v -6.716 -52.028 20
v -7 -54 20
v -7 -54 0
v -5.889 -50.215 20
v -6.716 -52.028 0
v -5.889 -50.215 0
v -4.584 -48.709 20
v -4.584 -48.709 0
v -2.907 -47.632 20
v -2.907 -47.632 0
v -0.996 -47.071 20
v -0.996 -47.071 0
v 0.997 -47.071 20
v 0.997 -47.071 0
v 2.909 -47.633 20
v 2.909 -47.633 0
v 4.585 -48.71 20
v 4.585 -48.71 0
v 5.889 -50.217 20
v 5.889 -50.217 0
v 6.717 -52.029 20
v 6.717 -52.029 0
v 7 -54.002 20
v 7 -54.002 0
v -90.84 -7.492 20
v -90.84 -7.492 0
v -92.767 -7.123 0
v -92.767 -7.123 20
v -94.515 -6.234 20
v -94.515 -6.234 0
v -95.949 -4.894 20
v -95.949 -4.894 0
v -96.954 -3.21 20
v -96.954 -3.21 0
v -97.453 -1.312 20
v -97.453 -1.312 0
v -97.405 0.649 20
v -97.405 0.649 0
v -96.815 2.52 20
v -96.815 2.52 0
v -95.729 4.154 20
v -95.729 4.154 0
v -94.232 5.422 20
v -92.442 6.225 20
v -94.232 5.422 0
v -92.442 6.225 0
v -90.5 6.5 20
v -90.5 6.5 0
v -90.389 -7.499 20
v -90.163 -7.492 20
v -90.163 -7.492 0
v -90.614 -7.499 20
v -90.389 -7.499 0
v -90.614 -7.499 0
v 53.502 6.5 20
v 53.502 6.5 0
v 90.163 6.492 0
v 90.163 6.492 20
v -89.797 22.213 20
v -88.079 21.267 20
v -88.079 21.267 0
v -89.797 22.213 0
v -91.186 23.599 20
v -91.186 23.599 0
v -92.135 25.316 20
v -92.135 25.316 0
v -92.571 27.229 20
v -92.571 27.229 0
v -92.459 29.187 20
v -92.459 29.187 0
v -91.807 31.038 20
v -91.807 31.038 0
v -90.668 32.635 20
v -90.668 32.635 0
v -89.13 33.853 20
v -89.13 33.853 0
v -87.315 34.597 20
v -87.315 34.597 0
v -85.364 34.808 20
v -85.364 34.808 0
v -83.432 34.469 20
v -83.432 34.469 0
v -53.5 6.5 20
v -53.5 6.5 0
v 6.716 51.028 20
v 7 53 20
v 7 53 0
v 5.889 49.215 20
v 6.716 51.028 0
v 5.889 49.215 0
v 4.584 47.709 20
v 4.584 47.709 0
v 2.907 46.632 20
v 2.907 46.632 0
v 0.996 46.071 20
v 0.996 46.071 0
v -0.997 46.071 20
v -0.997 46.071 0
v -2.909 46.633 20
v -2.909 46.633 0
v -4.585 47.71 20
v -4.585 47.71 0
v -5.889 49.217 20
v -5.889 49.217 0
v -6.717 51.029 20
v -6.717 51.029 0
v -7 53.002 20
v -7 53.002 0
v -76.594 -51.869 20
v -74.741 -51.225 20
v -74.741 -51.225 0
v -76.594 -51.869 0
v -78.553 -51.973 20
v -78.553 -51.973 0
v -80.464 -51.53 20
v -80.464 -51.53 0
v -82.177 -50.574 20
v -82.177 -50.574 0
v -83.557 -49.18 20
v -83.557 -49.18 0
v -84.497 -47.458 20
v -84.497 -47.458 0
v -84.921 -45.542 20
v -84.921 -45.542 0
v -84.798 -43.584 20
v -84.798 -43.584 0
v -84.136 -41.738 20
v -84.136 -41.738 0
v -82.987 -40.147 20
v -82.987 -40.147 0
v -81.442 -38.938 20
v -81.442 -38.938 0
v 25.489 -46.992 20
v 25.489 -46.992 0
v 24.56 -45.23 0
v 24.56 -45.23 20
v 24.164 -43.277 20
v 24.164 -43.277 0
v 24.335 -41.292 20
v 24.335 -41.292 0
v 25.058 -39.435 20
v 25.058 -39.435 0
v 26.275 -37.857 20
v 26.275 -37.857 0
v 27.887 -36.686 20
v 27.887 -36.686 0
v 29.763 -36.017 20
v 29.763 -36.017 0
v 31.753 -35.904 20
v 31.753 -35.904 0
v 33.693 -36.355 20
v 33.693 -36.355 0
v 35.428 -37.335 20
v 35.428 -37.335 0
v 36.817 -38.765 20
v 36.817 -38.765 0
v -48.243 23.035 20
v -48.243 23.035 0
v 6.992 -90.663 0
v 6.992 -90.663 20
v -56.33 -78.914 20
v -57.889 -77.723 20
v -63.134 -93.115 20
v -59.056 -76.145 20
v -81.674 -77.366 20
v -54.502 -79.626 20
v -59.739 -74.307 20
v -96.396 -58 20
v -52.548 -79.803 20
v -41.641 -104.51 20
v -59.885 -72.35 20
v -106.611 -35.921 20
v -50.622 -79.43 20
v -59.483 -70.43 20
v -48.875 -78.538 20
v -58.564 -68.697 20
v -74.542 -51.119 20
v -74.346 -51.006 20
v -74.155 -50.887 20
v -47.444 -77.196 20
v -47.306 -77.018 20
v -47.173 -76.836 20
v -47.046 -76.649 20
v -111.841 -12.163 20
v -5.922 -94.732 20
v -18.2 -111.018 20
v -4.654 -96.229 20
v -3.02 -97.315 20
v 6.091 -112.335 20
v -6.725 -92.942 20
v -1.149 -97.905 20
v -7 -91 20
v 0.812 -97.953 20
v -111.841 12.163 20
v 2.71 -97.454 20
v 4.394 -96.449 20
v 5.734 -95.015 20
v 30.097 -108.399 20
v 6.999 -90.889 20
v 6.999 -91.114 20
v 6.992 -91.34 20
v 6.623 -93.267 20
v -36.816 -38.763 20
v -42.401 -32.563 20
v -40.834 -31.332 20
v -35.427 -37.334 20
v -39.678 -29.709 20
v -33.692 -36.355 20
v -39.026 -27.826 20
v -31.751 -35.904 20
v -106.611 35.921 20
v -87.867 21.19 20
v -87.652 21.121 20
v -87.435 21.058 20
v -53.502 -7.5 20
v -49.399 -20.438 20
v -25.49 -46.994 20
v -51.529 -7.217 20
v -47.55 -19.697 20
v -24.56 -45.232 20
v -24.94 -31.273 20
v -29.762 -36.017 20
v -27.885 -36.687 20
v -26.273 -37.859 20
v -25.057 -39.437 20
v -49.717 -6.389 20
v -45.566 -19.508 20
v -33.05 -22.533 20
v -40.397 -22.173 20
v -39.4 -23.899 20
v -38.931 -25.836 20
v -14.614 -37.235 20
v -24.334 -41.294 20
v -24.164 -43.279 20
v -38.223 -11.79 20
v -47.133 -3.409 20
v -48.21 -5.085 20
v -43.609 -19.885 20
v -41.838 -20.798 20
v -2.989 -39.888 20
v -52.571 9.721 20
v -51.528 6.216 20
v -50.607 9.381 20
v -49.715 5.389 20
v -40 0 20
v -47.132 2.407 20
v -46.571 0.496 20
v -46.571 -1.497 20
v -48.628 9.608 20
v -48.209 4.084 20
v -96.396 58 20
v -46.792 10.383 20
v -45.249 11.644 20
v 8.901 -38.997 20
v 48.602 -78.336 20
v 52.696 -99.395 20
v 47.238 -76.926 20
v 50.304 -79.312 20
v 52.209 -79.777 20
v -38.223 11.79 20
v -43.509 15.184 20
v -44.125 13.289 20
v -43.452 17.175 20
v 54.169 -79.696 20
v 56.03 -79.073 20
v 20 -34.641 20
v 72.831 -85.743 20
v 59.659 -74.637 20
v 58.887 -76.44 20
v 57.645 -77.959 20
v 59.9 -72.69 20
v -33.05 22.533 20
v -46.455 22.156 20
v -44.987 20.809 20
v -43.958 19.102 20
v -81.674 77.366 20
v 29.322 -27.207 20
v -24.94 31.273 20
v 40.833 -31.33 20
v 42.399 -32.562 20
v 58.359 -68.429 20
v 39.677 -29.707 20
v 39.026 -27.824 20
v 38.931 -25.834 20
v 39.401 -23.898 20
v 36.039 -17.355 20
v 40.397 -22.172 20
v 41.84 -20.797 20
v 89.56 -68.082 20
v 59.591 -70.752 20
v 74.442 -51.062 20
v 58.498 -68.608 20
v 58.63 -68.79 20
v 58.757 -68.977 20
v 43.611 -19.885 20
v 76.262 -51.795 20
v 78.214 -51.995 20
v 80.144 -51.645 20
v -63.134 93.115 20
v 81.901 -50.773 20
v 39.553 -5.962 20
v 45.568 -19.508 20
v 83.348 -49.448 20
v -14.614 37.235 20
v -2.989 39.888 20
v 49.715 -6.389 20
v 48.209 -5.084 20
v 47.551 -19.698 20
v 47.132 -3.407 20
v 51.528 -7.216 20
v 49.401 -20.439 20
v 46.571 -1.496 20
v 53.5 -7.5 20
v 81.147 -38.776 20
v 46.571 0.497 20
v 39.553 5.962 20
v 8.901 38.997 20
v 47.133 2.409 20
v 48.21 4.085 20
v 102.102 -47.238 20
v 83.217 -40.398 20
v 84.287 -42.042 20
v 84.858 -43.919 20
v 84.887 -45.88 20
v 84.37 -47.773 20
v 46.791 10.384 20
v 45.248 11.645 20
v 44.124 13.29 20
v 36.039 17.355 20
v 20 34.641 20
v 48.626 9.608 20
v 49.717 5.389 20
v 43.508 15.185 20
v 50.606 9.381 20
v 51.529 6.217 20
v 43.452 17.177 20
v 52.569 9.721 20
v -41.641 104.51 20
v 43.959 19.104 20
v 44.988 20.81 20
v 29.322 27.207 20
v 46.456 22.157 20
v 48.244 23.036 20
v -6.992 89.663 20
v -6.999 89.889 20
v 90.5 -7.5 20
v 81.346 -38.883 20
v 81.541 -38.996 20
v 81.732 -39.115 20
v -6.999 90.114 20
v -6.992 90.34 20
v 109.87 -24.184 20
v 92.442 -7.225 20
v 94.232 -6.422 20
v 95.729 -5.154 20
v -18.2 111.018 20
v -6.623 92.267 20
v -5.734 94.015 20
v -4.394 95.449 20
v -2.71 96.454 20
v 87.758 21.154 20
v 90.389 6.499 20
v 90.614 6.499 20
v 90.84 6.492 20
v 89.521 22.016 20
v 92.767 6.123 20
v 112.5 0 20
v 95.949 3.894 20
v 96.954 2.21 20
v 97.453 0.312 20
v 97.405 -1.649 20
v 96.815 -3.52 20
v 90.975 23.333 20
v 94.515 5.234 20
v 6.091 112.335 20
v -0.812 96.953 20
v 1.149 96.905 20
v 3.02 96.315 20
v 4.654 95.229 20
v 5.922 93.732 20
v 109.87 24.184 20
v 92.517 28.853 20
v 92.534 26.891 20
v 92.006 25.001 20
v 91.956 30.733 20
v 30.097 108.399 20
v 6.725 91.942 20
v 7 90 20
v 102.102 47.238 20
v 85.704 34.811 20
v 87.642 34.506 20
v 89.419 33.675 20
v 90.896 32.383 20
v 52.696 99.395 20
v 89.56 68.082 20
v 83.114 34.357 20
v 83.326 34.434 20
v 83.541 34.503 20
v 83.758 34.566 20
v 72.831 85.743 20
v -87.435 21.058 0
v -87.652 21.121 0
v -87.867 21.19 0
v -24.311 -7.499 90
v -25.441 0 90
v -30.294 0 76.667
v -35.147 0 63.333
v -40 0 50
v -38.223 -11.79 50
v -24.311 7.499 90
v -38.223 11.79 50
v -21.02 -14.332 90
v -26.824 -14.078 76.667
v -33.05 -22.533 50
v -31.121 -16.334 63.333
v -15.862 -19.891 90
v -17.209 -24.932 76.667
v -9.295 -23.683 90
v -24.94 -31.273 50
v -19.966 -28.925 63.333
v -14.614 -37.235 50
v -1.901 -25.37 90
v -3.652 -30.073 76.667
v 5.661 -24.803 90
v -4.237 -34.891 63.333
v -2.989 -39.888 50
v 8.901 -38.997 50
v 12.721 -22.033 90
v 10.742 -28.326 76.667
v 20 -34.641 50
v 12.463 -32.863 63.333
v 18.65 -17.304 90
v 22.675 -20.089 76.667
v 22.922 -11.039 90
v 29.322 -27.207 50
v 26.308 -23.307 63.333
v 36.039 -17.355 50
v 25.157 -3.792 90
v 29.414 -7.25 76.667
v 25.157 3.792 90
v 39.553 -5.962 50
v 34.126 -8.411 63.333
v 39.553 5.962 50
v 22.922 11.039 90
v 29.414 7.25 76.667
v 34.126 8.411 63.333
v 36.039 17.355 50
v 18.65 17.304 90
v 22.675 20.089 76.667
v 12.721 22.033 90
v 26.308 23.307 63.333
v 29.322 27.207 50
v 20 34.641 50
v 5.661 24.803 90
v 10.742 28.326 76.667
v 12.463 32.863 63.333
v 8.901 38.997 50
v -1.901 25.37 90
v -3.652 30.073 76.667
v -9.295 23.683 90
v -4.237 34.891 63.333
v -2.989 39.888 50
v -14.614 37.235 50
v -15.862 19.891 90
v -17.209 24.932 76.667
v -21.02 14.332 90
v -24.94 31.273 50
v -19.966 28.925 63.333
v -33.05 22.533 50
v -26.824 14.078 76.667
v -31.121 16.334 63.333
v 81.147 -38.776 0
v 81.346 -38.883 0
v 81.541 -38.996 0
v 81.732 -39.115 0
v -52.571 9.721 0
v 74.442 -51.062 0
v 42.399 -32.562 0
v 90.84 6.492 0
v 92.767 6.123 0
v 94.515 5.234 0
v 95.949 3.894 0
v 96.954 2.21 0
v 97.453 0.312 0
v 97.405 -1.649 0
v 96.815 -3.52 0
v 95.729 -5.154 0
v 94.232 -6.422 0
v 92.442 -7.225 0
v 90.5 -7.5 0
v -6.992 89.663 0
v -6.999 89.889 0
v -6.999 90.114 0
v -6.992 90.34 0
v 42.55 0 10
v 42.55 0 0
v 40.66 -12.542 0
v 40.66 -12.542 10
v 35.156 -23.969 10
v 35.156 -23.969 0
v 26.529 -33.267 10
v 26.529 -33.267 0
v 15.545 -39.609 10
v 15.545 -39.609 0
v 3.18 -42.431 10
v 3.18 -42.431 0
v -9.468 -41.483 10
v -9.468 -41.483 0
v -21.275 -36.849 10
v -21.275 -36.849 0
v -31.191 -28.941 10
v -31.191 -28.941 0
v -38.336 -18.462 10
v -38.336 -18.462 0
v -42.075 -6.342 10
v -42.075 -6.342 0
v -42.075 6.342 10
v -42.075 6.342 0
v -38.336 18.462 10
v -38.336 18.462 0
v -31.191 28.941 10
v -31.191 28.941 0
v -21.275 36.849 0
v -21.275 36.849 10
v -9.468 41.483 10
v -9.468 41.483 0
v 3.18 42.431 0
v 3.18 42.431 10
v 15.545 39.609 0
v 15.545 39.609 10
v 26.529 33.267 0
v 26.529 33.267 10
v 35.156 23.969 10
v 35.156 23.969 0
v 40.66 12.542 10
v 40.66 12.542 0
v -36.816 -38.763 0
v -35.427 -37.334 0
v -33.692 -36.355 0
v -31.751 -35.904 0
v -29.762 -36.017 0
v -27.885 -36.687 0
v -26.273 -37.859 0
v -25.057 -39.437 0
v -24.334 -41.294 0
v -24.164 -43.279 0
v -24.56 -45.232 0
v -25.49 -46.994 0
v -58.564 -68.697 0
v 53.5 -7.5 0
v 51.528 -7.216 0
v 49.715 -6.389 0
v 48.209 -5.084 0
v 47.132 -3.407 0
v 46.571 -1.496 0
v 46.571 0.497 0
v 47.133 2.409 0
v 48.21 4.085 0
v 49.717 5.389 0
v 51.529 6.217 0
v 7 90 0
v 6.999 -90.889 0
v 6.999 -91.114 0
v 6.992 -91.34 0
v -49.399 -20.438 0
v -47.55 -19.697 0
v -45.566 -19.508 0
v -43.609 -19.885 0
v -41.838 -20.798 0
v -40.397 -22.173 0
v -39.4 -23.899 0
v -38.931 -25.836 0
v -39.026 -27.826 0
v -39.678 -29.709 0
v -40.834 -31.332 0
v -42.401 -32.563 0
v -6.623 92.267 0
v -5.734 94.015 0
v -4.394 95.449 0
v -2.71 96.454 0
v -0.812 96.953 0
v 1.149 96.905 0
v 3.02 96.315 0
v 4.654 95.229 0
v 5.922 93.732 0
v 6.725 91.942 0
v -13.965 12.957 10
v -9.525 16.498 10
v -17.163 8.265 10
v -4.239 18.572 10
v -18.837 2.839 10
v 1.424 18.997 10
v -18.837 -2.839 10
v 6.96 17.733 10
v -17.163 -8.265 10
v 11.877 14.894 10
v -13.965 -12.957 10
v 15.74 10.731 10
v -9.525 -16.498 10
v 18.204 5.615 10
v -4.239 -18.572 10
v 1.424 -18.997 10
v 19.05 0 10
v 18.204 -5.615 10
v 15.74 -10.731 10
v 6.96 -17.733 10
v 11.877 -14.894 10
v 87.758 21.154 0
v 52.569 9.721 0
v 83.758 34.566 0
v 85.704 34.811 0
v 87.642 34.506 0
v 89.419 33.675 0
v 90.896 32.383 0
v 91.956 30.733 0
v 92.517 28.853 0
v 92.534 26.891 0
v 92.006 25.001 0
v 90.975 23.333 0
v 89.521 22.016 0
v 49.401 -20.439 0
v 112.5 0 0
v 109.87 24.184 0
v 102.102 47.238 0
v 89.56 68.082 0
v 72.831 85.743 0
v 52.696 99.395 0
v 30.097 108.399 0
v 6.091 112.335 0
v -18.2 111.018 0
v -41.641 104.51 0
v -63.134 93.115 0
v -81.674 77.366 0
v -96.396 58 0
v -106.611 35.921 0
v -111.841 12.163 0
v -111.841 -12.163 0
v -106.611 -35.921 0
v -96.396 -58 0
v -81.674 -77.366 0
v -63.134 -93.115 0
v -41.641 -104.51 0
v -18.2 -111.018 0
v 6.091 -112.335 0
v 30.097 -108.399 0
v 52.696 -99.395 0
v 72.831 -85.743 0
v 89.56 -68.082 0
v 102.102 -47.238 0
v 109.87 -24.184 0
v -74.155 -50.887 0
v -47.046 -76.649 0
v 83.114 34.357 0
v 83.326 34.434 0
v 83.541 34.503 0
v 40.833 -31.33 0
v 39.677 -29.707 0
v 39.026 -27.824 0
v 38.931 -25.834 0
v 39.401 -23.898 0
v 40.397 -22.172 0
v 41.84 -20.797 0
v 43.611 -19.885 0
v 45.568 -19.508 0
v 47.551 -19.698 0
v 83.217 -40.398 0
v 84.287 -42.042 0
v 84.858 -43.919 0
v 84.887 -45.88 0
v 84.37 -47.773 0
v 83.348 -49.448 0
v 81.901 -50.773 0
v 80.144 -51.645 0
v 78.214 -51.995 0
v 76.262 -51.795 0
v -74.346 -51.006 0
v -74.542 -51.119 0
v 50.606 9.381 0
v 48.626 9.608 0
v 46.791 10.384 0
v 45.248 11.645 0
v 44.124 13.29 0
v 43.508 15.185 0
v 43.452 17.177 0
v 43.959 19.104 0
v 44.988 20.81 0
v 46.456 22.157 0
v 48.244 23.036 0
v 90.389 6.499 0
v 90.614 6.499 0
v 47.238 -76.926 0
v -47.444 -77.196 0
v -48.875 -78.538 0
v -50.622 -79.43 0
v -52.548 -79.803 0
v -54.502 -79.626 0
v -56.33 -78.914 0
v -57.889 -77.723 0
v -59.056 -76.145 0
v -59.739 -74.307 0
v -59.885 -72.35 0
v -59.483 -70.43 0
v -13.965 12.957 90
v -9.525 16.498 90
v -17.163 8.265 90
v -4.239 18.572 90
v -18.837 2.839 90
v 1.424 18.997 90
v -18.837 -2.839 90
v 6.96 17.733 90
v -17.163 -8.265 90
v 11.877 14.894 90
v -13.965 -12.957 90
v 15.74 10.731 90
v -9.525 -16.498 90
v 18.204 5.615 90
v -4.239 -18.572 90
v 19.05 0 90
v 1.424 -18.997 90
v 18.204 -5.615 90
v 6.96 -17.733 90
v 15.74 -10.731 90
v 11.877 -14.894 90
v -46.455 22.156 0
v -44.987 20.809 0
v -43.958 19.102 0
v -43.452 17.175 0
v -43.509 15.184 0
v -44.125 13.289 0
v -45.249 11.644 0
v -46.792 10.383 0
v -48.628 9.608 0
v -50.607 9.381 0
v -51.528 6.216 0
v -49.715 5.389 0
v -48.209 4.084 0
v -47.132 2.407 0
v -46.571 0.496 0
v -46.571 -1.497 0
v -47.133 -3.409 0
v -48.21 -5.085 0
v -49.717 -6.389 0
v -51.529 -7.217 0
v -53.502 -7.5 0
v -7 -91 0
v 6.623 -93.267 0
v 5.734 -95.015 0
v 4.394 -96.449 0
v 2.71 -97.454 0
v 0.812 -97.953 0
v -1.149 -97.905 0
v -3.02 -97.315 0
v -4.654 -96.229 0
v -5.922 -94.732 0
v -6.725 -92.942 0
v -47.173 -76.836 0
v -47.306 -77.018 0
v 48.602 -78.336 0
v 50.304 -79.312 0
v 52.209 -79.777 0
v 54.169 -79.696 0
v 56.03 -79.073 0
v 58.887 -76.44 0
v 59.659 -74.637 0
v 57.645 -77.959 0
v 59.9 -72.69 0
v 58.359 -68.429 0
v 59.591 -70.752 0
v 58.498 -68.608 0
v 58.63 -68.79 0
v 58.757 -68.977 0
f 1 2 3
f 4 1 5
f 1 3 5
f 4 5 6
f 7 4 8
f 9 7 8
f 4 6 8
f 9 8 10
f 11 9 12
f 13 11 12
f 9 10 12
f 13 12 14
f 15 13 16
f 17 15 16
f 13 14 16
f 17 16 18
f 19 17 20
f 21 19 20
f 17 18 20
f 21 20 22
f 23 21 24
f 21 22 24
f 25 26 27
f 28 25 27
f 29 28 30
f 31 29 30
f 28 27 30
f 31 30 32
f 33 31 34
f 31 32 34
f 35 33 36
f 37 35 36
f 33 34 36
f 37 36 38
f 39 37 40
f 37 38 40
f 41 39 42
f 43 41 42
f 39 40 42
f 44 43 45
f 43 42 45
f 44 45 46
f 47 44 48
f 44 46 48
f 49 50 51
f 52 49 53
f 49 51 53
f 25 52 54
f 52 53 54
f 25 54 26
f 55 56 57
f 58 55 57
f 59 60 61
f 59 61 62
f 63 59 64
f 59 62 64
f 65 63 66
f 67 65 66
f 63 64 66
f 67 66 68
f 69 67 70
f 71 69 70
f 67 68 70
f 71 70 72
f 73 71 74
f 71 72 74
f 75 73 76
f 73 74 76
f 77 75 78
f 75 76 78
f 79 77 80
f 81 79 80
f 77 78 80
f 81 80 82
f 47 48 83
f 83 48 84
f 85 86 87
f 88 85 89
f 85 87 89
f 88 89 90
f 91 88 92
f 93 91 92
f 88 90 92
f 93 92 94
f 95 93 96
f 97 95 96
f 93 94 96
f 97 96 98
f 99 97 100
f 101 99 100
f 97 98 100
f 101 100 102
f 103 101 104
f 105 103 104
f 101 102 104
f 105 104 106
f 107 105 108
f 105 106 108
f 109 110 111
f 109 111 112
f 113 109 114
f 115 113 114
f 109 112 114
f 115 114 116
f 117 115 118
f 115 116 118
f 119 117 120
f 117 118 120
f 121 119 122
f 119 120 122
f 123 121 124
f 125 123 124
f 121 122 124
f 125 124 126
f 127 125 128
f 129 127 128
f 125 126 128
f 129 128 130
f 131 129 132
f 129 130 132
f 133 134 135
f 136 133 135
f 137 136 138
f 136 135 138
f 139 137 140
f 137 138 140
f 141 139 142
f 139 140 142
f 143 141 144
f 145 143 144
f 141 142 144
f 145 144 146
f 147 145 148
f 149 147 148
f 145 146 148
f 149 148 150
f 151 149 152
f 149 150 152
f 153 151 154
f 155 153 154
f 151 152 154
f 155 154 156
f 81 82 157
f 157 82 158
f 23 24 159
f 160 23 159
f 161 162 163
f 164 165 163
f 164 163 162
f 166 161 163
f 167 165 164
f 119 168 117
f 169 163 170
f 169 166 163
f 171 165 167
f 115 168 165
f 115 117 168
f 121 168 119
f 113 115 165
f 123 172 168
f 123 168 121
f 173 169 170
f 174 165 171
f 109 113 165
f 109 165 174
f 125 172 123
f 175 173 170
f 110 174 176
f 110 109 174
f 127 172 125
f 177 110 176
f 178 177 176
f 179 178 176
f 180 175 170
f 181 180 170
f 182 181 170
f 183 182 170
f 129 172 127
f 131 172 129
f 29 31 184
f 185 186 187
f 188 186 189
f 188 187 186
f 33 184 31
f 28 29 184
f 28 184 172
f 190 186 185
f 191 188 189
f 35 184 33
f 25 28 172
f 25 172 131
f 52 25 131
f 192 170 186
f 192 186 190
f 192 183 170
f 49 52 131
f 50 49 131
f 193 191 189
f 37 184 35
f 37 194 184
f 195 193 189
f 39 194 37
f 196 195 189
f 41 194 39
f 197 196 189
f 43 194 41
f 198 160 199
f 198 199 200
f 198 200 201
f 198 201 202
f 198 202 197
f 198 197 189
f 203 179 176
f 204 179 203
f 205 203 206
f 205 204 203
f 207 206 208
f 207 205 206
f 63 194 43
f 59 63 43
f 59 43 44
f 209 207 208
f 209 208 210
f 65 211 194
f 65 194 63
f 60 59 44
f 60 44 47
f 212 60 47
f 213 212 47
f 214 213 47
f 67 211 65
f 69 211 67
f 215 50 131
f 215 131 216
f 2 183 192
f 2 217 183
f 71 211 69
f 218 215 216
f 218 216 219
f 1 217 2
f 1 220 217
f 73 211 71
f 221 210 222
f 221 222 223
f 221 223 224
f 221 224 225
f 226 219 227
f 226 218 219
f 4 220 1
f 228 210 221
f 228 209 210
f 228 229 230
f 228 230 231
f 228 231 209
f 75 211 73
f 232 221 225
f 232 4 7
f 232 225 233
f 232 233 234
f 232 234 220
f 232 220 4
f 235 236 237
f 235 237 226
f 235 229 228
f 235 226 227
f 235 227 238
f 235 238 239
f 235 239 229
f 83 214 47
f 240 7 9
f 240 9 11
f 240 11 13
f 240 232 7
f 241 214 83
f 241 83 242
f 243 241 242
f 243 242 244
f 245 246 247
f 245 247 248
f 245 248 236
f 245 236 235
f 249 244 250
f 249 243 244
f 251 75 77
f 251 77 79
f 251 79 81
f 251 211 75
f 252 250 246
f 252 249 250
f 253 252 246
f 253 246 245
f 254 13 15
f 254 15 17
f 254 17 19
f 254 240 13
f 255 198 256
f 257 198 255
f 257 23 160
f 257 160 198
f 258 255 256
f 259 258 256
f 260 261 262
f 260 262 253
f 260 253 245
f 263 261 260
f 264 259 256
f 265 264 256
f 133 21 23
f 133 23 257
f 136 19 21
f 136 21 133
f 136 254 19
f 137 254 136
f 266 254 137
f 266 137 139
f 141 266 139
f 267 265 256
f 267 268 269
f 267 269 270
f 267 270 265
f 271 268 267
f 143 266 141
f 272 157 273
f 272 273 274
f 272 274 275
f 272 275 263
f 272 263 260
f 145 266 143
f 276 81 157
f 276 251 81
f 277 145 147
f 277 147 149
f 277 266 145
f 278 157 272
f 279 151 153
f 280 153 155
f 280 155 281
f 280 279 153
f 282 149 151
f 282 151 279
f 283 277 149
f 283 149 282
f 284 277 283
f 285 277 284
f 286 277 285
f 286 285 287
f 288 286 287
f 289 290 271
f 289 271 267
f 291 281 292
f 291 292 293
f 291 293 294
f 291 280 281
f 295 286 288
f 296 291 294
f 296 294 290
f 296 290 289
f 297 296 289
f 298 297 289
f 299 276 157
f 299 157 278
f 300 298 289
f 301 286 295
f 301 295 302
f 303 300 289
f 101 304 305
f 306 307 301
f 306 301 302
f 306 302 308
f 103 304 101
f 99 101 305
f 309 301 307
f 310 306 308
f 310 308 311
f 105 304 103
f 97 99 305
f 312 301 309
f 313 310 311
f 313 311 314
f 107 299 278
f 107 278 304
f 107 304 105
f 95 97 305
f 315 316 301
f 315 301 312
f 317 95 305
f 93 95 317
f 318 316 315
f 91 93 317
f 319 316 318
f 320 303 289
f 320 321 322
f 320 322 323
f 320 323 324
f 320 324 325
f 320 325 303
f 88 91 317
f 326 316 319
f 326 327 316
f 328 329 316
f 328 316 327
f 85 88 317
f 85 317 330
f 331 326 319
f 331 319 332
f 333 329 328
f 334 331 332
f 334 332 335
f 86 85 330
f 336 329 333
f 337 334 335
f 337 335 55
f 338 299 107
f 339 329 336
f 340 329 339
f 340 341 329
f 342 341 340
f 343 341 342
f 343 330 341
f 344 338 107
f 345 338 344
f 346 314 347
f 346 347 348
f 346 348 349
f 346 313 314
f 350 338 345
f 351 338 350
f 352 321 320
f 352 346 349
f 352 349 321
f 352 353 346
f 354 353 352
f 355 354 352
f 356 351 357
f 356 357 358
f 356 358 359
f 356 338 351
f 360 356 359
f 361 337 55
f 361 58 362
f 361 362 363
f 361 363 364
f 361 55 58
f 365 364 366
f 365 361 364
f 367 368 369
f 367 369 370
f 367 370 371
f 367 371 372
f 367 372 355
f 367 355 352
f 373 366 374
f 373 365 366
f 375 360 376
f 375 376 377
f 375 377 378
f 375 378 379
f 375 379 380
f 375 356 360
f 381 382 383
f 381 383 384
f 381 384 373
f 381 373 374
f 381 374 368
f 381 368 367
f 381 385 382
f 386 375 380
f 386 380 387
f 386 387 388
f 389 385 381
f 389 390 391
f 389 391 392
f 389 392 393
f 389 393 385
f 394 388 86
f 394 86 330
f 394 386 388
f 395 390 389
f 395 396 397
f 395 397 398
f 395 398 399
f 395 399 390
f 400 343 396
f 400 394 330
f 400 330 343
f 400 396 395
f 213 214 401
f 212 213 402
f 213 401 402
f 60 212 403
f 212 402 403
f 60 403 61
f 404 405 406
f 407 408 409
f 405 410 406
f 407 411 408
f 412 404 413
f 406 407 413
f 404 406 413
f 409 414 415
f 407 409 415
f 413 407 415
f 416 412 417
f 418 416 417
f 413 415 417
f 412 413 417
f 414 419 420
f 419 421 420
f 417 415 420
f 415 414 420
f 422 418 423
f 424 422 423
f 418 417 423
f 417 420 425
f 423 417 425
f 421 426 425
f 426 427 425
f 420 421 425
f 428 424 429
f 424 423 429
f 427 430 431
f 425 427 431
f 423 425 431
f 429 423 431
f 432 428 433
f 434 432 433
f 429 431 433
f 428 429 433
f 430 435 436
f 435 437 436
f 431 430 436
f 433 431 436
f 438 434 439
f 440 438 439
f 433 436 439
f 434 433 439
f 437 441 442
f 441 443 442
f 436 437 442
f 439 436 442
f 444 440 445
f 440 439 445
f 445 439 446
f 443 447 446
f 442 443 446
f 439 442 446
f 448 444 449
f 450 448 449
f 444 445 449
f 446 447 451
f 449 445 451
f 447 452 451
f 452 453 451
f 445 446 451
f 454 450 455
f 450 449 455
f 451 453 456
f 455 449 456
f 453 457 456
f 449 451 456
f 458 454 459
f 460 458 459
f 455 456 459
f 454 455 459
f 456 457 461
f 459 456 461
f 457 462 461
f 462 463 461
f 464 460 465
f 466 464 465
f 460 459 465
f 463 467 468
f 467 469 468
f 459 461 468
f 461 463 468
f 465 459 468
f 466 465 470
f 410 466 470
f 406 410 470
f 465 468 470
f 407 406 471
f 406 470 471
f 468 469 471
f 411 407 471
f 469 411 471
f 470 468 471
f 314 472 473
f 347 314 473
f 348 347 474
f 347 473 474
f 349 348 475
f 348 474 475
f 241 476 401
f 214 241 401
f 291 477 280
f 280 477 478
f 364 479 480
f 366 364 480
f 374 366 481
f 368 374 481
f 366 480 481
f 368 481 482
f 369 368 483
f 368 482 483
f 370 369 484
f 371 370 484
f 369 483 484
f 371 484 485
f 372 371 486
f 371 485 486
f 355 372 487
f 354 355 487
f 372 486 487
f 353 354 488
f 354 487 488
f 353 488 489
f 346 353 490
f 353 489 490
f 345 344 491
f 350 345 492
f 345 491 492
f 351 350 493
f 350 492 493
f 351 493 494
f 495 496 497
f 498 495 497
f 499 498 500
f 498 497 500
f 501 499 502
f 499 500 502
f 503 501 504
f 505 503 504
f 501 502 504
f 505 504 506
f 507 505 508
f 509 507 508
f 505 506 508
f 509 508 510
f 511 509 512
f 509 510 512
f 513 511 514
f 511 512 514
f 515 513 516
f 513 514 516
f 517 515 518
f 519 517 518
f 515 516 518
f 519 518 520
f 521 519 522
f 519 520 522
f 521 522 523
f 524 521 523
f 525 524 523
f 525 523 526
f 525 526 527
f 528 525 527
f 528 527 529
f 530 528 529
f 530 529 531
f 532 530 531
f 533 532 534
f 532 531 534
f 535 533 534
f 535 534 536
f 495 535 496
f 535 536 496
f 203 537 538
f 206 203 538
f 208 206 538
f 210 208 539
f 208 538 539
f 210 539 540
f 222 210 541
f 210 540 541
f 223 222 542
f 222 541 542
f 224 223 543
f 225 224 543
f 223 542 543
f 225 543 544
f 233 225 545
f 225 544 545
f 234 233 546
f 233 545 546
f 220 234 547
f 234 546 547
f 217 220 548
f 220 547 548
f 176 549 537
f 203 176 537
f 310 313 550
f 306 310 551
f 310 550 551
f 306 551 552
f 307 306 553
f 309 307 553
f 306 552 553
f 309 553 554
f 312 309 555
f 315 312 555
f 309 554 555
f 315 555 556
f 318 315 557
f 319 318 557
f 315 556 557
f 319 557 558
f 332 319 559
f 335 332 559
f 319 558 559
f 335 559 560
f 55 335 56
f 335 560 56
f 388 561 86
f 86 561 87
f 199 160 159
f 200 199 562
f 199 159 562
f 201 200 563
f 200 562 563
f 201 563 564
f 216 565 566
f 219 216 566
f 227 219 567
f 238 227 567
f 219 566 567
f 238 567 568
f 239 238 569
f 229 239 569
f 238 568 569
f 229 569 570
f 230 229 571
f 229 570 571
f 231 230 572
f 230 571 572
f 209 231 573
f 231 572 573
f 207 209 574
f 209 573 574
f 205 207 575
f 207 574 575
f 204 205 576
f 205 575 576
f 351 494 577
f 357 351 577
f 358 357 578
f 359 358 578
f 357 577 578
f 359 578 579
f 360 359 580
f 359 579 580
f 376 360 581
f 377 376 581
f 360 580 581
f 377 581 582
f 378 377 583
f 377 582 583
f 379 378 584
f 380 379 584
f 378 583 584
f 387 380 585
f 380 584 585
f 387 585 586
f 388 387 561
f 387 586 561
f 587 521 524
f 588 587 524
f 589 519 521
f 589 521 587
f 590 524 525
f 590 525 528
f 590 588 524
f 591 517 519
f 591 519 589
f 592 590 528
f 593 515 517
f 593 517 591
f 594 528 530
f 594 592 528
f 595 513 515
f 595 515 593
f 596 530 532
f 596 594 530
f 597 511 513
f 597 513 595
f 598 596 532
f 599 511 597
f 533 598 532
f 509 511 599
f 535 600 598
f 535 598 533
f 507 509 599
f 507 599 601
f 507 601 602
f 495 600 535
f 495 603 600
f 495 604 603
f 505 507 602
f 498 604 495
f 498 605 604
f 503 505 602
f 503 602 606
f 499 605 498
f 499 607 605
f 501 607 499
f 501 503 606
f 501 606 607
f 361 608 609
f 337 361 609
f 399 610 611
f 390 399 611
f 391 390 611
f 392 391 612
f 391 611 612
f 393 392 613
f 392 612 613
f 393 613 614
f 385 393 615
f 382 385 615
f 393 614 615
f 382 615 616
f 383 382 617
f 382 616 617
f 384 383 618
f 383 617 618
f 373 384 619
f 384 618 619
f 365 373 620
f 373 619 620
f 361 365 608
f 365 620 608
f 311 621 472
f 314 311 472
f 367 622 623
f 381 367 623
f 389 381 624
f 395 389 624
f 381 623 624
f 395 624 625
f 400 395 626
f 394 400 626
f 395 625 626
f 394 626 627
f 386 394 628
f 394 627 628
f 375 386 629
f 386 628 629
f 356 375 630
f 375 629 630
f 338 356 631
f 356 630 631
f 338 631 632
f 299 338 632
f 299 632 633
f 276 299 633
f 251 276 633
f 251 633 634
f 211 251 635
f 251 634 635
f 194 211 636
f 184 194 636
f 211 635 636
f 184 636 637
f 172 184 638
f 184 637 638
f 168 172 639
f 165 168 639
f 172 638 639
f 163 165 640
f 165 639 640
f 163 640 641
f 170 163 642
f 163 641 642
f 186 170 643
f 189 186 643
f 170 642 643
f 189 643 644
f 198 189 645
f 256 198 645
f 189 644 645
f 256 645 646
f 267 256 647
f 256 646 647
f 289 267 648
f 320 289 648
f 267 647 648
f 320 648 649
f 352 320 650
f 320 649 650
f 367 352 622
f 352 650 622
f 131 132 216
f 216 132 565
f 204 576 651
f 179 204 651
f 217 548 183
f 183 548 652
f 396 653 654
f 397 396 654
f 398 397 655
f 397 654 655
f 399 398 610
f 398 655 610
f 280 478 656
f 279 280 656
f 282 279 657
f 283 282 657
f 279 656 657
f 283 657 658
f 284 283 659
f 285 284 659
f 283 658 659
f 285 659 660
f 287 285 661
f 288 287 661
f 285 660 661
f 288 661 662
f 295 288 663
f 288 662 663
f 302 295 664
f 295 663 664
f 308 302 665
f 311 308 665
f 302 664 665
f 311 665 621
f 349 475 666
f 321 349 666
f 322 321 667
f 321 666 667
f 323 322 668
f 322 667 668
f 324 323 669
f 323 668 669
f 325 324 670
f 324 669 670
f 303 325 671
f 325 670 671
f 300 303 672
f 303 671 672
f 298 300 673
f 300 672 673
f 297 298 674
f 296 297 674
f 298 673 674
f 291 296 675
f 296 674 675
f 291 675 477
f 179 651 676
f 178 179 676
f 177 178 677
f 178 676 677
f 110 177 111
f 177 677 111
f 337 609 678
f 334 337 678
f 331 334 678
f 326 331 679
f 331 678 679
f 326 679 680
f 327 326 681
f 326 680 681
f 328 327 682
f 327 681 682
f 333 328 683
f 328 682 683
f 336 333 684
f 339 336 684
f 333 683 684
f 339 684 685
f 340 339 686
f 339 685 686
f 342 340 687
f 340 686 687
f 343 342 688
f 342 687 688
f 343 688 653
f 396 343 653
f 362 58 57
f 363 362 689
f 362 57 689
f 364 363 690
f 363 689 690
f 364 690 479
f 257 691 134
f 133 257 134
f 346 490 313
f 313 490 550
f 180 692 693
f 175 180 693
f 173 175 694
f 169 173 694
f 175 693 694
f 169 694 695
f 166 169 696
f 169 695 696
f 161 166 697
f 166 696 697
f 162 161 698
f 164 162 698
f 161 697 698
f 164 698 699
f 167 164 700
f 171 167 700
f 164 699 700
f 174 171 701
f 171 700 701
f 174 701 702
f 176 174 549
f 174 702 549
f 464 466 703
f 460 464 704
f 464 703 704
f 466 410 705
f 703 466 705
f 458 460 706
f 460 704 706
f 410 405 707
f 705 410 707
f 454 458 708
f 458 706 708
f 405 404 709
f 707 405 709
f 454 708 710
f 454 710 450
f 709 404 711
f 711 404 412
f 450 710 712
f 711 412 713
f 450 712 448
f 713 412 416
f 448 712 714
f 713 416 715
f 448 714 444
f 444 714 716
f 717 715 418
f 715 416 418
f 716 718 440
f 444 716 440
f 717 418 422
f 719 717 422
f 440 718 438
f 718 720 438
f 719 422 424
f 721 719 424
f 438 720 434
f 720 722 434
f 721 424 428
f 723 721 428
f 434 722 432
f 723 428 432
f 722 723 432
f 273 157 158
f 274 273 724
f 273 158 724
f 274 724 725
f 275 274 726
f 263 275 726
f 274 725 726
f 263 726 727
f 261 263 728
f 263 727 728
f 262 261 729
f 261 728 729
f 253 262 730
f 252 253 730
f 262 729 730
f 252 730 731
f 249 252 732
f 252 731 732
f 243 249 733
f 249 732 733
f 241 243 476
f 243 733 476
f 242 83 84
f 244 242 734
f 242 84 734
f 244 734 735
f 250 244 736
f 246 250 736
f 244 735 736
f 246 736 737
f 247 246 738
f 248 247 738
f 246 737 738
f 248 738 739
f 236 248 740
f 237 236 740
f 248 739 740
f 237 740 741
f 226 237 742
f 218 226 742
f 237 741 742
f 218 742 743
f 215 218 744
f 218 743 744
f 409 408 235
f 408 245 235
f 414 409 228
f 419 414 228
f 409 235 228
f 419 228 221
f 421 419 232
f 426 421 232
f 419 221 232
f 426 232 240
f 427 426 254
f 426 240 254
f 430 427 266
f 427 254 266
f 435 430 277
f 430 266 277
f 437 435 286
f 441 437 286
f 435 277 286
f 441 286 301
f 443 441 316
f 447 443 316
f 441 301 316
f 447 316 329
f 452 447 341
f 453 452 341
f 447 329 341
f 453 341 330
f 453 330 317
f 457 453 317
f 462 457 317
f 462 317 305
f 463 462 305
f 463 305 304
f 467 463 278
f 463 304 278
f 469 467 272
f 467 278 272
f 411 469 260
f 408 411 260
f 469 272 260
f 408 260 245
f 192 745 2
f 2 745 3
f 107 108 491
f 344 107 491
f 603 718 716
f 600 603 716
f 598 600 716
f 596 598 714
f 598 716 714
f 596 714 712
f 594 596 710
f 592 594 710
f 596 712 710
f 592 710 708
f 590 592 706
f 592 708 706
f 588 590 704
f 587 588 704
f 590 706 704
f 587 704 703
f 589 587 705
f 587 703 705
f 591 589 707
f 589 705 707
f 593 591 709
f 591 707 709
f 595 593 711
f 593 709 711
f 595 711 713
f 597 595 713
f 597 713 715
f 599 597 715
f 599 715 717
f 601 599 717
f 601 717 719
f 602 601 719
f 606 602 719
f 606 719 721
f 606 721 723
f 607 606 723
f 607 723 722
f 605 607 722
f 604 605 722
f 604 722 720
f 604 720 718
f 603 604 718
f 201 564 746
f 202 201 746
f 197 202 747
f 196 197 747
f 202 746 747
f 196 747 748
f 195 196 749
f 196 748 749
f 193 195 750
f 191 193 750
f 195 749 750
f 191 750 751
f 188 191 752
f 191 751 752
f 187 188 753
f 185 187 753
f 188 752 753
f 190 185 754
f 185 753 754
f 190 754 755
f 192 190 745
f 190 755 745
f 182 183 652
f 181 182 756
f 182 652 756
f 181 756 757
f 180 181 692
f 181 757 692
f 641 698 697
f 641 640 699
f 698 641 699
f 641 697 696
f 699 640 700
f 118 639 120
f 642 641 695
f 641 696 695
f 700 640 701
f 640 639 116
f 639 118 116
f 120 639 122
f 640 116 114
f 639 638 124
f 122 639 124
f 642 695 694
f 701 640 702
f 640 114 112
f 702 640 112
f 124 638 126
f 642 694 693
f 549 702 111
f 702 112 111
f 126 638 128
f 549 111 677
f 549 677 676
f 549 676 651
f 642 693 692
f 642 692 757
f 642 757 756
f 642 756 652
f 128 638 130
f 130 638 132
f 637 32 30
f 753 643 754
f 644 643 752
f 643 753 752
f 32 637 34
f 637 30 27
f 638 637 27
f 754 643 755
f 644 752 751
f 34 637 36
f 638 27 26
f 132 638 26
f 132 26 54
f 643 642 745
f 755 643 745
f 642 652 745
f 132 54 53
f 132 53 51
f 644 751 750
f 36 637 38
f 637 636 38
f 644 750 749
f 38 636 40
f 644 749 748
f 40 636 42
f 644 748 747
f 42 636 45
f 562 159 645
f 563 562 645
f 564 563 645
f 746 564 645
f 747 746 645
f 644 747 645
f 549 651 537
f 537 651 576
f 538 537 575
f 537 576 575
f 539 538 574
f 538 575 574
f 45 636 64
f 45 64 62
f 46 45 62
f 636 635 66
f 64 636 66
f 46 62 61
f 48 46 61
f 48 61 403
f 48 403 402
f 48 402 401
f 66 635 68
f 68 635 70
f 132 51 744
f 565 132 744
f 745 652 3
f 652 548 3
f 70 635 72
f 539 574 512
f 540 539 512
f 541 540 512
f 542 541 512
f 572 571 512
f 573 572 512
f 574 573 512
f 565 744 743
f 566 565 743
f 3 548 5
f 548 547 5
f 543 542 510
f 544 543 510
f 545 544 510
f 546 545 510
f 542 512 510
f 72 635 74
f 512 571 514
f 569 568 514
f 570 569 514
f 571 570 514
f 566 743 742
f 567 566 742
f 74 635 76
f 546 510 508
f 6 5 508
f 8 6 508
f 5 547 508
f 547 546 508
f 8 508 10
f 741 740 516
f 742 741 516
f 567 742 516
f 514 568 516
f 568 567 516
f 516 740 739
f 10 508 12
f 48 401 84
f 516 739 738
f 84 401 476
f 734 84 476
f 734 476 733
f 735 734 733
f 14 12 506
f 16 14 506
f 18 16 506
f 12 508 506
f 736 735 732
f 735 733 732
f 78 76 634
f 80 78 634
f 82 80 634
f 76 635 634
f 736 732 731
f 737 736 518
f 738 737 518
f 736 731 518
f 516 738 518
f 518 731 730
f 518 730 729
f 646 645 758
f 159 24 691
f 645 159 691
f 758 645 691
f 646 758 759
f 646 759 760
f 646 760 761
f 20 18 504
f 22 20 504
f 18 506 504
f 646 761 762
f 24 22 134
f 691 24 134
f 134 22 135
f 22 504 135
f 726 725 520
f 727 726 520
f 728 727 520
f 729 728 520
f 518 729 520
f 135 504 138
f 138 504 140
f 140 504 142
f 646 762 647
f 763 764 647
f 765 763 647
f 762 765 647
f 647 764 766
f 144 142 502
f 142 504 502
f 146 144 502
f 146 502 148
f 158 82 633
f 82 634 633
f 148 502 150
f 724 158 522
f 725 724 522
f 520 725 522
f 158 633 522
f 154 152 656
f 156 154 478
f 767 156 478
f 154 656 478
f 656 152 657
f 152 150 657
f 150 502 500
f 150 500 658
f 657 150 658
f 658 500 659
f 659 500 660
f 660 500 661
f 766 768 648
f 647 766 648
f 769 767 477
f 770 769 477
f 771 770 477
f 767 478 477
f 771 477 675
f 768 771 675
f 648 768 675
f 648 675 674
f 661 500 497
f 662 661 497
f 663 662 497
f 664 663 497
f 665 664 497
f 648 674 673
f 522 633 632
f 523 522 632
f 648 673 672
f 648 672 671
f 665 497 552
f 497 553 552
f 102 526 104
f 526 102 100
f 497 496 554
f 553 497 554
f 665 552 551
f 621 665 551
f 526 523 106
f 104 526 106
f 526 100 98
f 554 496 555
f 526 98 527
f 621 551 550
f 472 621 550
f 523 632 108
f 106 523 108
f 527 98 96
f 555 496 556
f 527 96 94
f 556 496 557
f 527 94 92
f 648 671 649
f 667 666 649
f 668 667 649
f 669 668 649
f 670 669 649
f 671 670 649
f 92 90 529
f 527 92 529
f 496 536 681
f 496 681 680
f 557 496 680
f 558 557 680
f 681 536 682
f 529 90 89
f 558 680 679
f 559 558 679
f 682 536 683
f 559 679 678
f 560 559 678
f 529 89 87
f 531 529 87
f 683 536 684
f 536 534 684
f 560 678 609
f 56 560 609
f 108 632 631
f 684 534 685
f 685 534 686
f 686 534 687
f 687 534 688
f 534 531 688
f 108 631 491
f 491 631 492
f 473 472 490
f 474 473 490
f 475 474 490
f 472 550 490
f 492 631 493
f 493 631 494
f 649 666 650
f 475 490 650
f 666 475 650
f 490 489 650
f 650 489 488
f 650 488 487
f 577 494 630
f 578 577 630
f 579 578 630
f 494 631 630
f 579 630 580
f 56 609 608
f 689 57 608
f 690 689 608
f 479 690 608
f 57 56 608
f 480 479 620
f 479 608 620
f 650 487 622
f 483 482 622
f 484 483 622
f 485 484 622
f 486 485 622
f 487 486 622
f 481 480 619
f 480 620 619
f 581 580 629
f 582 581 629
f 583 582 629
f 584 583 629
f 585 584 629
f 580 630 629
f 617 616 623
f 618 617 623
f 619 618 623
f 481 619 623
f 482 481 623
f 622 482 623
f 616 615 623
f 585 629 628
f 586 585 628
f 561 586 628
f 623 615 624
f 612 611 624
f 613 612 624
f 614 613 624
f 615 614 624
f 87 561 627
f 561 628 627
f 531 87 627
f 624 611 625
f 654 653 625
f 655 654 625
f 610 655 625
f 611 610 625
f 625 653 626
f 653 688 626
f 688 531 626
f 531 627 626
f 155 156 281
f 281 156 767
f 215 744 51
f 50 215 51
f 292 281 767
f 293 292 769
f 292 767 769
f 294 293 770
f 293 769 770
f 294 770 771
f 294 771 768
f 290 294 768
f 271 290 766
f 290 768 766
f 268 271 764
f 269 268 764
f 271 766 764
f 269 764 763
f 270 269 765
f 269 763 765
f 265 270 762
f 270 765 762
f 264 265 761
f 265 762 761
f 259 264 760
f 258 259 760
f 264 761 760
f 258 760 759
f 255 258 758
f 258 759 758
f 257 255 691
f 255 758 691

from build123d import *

# Parameters (mm, degrees)
F0_R     = 112.5
F1_DEPTH = 20
F4_R     = 19.05
F5_DEPTH = 90
F6_R     = 42.55
F7_DEPTH = 10


with BuildPart() as f1:
    # F0 (on Top) → F1 (new body)
    with BuildSketch(Plane.XY):
        Circle(F0_R)
        with BuildLine():
            ThreePointArc((-47.443954, -77.196073), (-57.151446, -78.373088), (-58.563792, -68.697033))
            Line((-58.563792, -68.697033), (-36.815737, -38.763404))
            ThreePointArc((-36.815737, -38.763404), (-27.037496, -37.215236), (-25.490409, -46.993649))
            Line((-25.490409, -46.993649), (-47.046201, -76.648867))
            ThreePointArc((-47.046201, -76.648867), (-47.238463, -76.927278), (-47.443954, -77.196073))
        make_face(mode=Mode.SUBTRACT)
        with BuildLine():
            ThreePointArc((-74.74068, -51.224927), (-84.08765, -48.351791), (-81.442286, -38.937822))
            Line((-81.442286, -38.937822), (-49.399346, -20.437822))
            ThreePointArc((-49.399346, -20.437822), (-39.836782, -23.00067), (-42.400686, -32.562951))
            Line((-42.400686, -32.562951), (-74.154746, -50.886811))
            ThreePointArc((-74.154746, -50.886811), (-74.443626, -51.062951), (-74.74068, -51.224927))
        make_face(mode=Mode.SUBTRACT)
        with BuildLine():
            ThreePointArc((-90.839791, -7.491748), (-97.497937, -0.330054), (-90.5, 6.5))
            Line((-90.5, 6.5), (-53.5, 6.5))
            ThreePointArc((-53.5, 6.5), (-46.5, -0.500773), (-53.501547, -7.5))
            Line((-53.501547, -7.5), (-90.163299, -7.491898))
            ThreePointArc((-90.163299, -7.491898), (-90.501547, -7.5), (-90.839791, -7.491748))
        make_face(mode=Mode.SUBTRACT)
        with BuildLine():
            ThreePointArc((6.991748, -91.339791), (-0.169946, -97.997937), (-7, -91))
            Line((-7, -91), (-7, -54))
            ThreePointArc((-7, -54), (0.000773, -47), (7, -54.001547))
            Line((7, -54.001547), (6.991898, -90.663299))
            ThreePointArc((6.991898, -90.663299), (7, -91.001547), (6.991748, -91.339791))
        make_face(mode=Mode.SUBTRACT)
        with BuildLine():
            ThreePointArc((58.75684, -68.97678), (56.876468, -78.572871), (47.237554, -76.926026))
            Line((47.237554, -76.926026), (25.489499, -46.992397))
            ThreePointArc((25.489499, -46.992397), (27.038747, -37.214327), (36.816646, -38.764656))
            Line((36.816646, -38.764656), (58.359329, -68.429399))
            ThreePointArc((58.359329, -68.429399), (58.564701, -68.698284), (58.75684, -68.97678))
        make_face(mode=Mode.SUBTRACT)
        with BuildLine():
            ThreePointArc((81.732428, -39.114864), (83.917705, -48.646146), (74.442286, -51.062178))
            Line((74.442286, -51.062178), (42.399346, -32.562178))
            ThreePointArc((42.399346, -32.562178), (39.837555, -22.99933), (49.400686, -20.438596))
            Line((49.400686, -20.438596), (81.146644, -38.776489))
            ThreePointArc((81.146644, -38.776489), (81.443626, -38.938596), (81.732428, -39.114864))
        make_face(mode=Mode.SUBTRACT)
        with BuildLine():
            ThreePointArc((90.839791, 6.491748), (97.497937, -0.669946), (90.5, -7.5))
            Line((90.5, -7.5), (53.5, -7.5))
            ThreePointArc((53.5, -7.5), (46.5, -0.499227), (53.501547, 6.5))
            Line((53.501547, 6.5), (90.163299, 6.491898))
            ThreePointArc((90.163299, 6.491898), (90.501547, 6.5), (90.839791, 6.491748))
        make_face(mode=Mode.SUBTRACT)
        with BuildLine():
            ThreePointArc((-88.078816, 21.266983), (-92.198004, 30.135639), (-83.431968, 34.468925))
            Line((-83.431968, 34.468925), (-48.242876, 23.035296))
            ThreePointArc((-48.242876, 23.035296), (-43.748839, 14.214046), (-52.570586, 9.720983))
            Line((-52.570586, 9.720983), (-87.43548, 21.057793))
            ThreePointArc((-87.43548, 21.057793), (-87.759677, 21.154612), (-88.078816, 21.266983))
        make_face(mode=Mode.SUBTRACT)
        with BuildLine():
            ThreePointArc((83.757678, 34.566078), (92.303036, 29.812383), (87.758205, 21.154134))
            Line((87.758205, 21.154134), (52.569114, 9.720505))
            ThreePointArc((52.569114, 9.720505), (43.748361, 14.215517), (48.244348, 23.035774))
            Line((48.244348, 23.035774), (83.11425, 34.357173))
            ThreePointArc((83.11425, 34.357173), (83.433439, 34.469403), (83.757678, 34.566078))
        make_face(mode=Mode.SUBTRACT)
        with BuildLine():
            ThreePointArc((7, 53), (-0.000773, 46), (-7, 53.001547))
            Line((-7, 53.001547), (-6.991898, 89.663299))
            ThreePointArc((-6.991898, 89.663299), (-7, 90.001547), (-6.991748, 90.339791))
            ThreePointArc((-6.991748, 90.339791), (0.169946, 96.997937), (7, 90))
            Line((7, 90), (7, 53))
        make_face(mode=Mode.SUBTRACT)
    extrude(amount=F1_DEPTH)

    # F2 (on Front) → F3 (revolve)
    with BuildSketch(Plane.XZ):
        Polygon((-40, 50), (-40, 20), (0, 20), (0, 90), (-25.441191, 90), align=None)
    revolve(axis=Axis((0, 0, 55), (0, 0, 1)))

    # F4 (on face) → F5 (cut, through all)
    with BuildSketch(Plane.XY.offset(90)):
        Circle(F4_R)
    extrude(amount=-F5_DEPTH, mode=Mode.SUBTRACT)

    # F6 (on face) → F7 (cut)
    with BuildSketch(Plane(origin=(0, 0, 0), x_dir=(1, 0, 0), z_dir=(0, 0, -1))):
        Circle(F6_R)
    extrude(amount=-F7_DEPTH, mode=Mode.SUBTRACT)


solid = f1.part
